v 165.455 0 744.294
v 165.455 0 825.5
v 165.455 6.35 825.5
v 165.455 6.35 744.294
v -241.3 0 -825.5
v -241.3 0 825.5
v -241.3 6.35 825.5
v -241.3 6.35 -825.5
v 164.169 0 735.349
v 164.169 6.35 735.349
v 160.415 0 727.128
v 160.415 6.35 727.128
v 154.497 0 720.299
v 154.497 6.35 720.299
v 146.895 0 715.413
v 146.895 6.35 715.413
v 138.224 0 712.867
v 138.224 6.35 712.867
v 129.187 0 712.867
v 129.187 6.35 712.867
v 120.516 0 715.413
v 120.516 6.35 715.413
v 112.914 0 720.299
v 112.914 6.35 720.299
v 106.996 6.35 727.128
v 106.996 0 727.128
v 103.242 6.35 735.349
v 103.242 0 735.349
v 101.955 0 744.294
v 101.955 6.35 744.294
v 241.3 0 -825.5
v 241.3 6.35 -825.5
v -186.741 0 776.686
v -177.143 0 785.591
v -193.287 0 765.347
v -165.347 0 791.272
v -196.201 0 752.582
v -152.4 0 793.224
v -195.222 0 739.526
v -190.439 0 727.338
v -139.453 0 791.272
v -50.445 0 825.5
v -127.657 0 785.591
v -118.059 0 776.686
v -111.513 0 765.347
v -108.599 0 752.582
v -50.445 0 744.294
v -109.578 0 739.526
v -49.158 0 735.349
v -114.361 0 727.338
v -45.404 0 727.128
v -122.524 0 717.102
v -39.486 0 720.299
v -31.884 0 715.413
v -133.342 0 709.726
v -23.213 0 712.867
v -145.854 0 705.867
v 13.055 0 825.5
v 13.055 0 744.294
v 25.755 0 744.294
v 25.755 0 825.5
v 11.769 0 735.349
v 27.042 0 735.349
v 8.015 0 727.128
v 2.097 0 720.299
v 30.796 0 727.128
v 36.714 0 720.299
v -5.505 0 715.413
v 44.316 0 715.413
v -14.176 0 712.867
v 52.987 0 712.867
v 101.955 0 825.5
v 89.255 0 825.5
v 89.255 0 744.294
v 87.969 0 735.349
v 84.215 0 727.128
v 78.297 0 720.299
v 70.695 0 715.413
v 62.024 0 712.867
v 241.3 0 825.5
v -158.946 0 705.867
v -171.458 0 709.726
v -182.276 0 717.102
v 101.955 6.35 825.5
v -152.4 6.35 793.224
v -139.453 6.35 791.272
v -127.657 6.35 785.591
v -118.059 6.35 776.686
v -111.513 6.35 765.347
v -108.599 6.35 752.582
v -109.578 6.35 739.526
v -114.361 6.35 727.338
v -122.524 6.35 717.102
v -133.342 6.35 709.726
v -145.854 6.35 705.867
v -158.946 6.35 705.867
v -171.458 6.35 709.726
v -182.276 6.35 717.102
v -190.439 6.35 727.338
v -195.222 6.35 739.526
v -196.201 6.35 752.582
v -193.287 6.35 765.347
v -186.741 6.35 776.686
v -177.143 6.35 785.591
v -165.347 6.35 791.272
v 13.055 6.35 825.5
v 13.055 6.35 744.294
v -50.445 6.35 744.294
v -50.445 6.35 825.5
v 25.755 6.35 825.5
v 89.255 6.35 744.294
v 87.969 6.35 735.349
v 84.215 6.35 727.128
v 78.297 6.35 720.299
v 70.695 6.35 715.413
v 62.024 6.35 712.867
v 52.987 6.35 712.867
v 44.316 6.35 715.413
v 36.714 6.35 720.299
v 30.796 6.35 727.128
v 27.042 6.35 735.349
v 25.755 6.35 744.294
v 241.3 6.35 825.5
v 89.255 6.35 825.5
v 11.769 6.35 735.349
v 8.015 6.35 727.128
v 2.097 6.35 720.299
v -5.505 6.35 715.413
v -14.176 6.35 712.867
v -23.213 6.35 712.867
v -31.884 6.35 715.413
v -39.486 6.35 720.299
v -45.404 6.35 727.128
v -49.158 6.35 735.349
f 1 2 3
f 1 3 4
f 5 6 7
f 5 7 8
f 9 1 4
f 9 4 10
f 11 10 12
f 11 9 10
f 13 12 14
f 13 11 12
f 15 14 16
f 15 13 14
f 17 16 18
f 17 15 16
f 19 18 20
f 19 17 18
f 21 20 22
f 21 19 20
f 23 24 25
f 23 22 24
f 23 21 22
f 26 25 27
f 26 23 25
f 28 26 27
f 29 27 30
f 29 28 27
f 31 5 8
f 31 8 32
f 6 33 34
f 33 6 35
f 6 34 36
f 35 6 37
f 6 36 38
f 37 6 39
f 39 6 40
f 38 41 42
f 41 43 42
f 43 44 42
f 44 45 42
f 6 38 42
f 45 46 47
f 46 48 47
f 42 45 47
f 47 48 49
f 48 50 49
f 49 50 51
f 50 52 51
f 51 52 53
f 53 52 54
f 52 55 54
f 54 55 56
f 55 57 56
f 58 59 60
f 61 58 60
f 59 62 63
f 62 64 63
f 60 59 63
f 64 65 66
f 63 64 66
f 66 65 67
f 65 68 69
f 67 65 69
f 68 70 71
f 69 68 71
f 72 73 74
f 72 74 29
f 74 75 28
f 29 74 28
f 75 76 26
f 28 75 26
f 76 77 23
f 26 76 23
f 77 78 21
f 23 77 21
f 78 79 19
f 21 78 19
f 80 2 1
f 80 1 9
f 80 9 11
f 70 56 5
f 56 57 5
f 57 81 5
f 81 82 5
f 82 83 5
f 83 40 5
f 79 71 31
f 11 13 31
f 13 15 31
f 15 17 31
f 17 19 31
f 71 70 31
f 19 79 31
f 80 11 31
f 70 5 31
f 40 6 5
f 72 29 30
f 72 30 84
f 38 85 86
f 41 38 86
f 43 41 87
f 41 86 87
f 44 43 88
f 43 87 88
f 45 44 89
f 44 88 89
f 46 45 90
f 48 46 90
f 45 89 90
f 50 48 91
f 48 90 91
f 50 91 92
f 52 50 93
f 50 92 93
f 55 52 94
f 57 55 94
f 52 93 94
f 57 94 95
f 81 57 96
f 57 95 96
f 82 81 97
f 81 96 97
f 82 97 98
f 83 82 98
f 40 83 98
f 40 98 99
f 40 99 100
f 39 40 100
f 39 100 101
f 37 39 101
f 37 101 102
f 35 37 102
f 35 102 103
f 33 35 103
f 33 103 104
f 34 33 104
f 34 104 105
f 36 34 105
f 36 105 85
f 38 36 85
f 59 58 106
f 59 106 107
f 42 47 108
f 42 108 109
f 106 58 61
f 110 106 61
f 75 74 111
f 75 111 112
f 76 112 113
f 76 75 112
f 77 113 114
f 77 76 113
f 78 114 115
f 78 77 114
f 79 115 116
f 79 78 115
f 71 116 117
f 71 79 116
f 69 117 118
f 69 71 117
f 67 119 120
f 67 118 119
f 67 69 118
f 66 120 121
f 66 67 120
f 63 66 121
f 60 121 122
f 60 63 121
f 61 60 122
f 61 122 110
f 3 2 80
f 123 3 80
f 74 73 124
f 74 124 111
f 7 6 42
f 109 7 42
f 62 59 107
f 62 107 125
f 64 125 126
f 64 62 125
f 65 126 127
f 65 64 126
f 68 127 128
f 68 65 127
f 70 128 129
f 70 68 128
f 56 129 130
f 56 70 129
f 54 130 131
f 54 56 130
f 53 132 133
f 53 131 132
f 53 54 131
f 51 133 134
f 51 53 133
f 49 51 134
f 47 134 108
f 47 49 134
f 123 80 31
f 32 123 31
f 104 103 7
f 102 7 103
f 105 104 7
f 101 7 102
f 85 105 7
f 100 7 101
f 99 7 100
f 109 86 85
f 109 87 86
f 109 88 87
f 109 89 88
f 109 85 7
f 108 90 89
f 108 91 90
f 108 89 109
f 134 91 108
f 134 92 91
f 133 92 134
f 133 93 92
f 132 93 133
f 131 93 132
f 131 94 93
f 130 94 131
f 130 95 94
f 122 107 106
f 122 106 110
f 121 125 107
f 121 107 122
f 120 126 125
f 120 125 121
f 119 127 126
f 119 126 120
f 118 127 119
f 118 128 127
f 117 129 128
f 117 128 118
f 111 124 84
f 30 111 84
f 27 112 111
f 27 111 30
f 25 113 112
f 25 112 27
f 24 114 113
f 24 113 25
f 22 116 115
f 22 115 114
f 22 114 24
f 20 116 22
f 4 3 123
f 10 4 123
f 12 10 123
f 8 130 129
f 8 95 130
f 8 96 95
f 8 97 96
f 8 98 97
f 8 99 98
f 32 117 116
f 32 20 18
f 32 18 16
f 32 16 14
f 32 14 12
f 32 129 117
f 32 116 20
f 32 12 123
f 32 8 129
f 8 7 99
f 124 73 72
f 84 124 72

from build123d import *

# Parameters (mm, degrees)
SKETCH1_W           = 482.6
SKETCH1_H           = 1651
BOSS_EXTRUDE1_DEPTH = 6.35
SKETCH2_R           = 43.923649364
CUT_EXTRUDE1_DEPTH  = 861.067591821
CUT_EXTRUDE3_DEPTH  = 861.067591821


with BuildPart() as part:
    # Sketch1 → Boss-Extrude1 (new body)
    with BuildSketch(Plane(origin=(0, 0, 0), x_dir=(1, 0, 0), z_dir=(0, 1, 0))):
        Rectangle(SKETCH1_W, SKETCH1_H)
    extrude(amount=BOSS_EXTRUDE1_DEPTH)

    # Sketch2 → Cut-Extrude1 (cut, through all)
    with BuildSketch(Plane(origin=(0, 6.35, 0), x_dir=(1, 0, 0), z_dir=(0, 1, 0))):
        with Locations(Location((-152.4, -749.3, 0), (0, 0, 270))):
            Circle(SKETCH2_R)
    extrude(amount=-CUT_EXTRUDE1_DEPTH, mode=Mode.SUBTRACT)

    # Sketch4 → Cut-Extrude3 (cut, through all)
    with BuildSketch(Plane.XZ):
        with BuildLine():
            Line((-50.444519558, 744.293611593), (-50.444519558, 825.5))
            Line((-50.444519558, 825.5), (13.055480442, 825.5))
            Line((13.055480442, 825.5), (13.055480442, 744.293611593))
            ThreePointArc((13.055480442, 744.293611593), (-18.694519558, 712.543611593), (-50.444519558, 744.293611593))
        make_face()
        with BuildLine():
            Line((25.755480442, 744.293611593), (25.755480442, 825.5))
            Line((25.755480442, 825.5), (89.255480442, 825.5))
            Line((89.255480442, 825.5), (89.255480442, 744.293611593))
            ThreePointArc((89.255480442, 744.293611593), (57.505480442, 712.543611593), (25.755480442, 744.293611593))
        make_face()
        with BuildLine():
            Line((101.955480442, 744.293611593), (101.955480442, 825.5))
            Line((101.955480442, 825.5), (165.455480442, 825.5))
            Line((165.455480442, 825.5), (165.455480442, 744.293611593))
            ThreePointArc((165.455480442, 744.293611593), (133.705480442, 712.543611593), (101.955480442, 744.293611593))
        make_face()
    extrude(amount=-CUT_EXTRUDE3_DEPTH, mode=Mode.SUBTRACT)


solid = part.part
